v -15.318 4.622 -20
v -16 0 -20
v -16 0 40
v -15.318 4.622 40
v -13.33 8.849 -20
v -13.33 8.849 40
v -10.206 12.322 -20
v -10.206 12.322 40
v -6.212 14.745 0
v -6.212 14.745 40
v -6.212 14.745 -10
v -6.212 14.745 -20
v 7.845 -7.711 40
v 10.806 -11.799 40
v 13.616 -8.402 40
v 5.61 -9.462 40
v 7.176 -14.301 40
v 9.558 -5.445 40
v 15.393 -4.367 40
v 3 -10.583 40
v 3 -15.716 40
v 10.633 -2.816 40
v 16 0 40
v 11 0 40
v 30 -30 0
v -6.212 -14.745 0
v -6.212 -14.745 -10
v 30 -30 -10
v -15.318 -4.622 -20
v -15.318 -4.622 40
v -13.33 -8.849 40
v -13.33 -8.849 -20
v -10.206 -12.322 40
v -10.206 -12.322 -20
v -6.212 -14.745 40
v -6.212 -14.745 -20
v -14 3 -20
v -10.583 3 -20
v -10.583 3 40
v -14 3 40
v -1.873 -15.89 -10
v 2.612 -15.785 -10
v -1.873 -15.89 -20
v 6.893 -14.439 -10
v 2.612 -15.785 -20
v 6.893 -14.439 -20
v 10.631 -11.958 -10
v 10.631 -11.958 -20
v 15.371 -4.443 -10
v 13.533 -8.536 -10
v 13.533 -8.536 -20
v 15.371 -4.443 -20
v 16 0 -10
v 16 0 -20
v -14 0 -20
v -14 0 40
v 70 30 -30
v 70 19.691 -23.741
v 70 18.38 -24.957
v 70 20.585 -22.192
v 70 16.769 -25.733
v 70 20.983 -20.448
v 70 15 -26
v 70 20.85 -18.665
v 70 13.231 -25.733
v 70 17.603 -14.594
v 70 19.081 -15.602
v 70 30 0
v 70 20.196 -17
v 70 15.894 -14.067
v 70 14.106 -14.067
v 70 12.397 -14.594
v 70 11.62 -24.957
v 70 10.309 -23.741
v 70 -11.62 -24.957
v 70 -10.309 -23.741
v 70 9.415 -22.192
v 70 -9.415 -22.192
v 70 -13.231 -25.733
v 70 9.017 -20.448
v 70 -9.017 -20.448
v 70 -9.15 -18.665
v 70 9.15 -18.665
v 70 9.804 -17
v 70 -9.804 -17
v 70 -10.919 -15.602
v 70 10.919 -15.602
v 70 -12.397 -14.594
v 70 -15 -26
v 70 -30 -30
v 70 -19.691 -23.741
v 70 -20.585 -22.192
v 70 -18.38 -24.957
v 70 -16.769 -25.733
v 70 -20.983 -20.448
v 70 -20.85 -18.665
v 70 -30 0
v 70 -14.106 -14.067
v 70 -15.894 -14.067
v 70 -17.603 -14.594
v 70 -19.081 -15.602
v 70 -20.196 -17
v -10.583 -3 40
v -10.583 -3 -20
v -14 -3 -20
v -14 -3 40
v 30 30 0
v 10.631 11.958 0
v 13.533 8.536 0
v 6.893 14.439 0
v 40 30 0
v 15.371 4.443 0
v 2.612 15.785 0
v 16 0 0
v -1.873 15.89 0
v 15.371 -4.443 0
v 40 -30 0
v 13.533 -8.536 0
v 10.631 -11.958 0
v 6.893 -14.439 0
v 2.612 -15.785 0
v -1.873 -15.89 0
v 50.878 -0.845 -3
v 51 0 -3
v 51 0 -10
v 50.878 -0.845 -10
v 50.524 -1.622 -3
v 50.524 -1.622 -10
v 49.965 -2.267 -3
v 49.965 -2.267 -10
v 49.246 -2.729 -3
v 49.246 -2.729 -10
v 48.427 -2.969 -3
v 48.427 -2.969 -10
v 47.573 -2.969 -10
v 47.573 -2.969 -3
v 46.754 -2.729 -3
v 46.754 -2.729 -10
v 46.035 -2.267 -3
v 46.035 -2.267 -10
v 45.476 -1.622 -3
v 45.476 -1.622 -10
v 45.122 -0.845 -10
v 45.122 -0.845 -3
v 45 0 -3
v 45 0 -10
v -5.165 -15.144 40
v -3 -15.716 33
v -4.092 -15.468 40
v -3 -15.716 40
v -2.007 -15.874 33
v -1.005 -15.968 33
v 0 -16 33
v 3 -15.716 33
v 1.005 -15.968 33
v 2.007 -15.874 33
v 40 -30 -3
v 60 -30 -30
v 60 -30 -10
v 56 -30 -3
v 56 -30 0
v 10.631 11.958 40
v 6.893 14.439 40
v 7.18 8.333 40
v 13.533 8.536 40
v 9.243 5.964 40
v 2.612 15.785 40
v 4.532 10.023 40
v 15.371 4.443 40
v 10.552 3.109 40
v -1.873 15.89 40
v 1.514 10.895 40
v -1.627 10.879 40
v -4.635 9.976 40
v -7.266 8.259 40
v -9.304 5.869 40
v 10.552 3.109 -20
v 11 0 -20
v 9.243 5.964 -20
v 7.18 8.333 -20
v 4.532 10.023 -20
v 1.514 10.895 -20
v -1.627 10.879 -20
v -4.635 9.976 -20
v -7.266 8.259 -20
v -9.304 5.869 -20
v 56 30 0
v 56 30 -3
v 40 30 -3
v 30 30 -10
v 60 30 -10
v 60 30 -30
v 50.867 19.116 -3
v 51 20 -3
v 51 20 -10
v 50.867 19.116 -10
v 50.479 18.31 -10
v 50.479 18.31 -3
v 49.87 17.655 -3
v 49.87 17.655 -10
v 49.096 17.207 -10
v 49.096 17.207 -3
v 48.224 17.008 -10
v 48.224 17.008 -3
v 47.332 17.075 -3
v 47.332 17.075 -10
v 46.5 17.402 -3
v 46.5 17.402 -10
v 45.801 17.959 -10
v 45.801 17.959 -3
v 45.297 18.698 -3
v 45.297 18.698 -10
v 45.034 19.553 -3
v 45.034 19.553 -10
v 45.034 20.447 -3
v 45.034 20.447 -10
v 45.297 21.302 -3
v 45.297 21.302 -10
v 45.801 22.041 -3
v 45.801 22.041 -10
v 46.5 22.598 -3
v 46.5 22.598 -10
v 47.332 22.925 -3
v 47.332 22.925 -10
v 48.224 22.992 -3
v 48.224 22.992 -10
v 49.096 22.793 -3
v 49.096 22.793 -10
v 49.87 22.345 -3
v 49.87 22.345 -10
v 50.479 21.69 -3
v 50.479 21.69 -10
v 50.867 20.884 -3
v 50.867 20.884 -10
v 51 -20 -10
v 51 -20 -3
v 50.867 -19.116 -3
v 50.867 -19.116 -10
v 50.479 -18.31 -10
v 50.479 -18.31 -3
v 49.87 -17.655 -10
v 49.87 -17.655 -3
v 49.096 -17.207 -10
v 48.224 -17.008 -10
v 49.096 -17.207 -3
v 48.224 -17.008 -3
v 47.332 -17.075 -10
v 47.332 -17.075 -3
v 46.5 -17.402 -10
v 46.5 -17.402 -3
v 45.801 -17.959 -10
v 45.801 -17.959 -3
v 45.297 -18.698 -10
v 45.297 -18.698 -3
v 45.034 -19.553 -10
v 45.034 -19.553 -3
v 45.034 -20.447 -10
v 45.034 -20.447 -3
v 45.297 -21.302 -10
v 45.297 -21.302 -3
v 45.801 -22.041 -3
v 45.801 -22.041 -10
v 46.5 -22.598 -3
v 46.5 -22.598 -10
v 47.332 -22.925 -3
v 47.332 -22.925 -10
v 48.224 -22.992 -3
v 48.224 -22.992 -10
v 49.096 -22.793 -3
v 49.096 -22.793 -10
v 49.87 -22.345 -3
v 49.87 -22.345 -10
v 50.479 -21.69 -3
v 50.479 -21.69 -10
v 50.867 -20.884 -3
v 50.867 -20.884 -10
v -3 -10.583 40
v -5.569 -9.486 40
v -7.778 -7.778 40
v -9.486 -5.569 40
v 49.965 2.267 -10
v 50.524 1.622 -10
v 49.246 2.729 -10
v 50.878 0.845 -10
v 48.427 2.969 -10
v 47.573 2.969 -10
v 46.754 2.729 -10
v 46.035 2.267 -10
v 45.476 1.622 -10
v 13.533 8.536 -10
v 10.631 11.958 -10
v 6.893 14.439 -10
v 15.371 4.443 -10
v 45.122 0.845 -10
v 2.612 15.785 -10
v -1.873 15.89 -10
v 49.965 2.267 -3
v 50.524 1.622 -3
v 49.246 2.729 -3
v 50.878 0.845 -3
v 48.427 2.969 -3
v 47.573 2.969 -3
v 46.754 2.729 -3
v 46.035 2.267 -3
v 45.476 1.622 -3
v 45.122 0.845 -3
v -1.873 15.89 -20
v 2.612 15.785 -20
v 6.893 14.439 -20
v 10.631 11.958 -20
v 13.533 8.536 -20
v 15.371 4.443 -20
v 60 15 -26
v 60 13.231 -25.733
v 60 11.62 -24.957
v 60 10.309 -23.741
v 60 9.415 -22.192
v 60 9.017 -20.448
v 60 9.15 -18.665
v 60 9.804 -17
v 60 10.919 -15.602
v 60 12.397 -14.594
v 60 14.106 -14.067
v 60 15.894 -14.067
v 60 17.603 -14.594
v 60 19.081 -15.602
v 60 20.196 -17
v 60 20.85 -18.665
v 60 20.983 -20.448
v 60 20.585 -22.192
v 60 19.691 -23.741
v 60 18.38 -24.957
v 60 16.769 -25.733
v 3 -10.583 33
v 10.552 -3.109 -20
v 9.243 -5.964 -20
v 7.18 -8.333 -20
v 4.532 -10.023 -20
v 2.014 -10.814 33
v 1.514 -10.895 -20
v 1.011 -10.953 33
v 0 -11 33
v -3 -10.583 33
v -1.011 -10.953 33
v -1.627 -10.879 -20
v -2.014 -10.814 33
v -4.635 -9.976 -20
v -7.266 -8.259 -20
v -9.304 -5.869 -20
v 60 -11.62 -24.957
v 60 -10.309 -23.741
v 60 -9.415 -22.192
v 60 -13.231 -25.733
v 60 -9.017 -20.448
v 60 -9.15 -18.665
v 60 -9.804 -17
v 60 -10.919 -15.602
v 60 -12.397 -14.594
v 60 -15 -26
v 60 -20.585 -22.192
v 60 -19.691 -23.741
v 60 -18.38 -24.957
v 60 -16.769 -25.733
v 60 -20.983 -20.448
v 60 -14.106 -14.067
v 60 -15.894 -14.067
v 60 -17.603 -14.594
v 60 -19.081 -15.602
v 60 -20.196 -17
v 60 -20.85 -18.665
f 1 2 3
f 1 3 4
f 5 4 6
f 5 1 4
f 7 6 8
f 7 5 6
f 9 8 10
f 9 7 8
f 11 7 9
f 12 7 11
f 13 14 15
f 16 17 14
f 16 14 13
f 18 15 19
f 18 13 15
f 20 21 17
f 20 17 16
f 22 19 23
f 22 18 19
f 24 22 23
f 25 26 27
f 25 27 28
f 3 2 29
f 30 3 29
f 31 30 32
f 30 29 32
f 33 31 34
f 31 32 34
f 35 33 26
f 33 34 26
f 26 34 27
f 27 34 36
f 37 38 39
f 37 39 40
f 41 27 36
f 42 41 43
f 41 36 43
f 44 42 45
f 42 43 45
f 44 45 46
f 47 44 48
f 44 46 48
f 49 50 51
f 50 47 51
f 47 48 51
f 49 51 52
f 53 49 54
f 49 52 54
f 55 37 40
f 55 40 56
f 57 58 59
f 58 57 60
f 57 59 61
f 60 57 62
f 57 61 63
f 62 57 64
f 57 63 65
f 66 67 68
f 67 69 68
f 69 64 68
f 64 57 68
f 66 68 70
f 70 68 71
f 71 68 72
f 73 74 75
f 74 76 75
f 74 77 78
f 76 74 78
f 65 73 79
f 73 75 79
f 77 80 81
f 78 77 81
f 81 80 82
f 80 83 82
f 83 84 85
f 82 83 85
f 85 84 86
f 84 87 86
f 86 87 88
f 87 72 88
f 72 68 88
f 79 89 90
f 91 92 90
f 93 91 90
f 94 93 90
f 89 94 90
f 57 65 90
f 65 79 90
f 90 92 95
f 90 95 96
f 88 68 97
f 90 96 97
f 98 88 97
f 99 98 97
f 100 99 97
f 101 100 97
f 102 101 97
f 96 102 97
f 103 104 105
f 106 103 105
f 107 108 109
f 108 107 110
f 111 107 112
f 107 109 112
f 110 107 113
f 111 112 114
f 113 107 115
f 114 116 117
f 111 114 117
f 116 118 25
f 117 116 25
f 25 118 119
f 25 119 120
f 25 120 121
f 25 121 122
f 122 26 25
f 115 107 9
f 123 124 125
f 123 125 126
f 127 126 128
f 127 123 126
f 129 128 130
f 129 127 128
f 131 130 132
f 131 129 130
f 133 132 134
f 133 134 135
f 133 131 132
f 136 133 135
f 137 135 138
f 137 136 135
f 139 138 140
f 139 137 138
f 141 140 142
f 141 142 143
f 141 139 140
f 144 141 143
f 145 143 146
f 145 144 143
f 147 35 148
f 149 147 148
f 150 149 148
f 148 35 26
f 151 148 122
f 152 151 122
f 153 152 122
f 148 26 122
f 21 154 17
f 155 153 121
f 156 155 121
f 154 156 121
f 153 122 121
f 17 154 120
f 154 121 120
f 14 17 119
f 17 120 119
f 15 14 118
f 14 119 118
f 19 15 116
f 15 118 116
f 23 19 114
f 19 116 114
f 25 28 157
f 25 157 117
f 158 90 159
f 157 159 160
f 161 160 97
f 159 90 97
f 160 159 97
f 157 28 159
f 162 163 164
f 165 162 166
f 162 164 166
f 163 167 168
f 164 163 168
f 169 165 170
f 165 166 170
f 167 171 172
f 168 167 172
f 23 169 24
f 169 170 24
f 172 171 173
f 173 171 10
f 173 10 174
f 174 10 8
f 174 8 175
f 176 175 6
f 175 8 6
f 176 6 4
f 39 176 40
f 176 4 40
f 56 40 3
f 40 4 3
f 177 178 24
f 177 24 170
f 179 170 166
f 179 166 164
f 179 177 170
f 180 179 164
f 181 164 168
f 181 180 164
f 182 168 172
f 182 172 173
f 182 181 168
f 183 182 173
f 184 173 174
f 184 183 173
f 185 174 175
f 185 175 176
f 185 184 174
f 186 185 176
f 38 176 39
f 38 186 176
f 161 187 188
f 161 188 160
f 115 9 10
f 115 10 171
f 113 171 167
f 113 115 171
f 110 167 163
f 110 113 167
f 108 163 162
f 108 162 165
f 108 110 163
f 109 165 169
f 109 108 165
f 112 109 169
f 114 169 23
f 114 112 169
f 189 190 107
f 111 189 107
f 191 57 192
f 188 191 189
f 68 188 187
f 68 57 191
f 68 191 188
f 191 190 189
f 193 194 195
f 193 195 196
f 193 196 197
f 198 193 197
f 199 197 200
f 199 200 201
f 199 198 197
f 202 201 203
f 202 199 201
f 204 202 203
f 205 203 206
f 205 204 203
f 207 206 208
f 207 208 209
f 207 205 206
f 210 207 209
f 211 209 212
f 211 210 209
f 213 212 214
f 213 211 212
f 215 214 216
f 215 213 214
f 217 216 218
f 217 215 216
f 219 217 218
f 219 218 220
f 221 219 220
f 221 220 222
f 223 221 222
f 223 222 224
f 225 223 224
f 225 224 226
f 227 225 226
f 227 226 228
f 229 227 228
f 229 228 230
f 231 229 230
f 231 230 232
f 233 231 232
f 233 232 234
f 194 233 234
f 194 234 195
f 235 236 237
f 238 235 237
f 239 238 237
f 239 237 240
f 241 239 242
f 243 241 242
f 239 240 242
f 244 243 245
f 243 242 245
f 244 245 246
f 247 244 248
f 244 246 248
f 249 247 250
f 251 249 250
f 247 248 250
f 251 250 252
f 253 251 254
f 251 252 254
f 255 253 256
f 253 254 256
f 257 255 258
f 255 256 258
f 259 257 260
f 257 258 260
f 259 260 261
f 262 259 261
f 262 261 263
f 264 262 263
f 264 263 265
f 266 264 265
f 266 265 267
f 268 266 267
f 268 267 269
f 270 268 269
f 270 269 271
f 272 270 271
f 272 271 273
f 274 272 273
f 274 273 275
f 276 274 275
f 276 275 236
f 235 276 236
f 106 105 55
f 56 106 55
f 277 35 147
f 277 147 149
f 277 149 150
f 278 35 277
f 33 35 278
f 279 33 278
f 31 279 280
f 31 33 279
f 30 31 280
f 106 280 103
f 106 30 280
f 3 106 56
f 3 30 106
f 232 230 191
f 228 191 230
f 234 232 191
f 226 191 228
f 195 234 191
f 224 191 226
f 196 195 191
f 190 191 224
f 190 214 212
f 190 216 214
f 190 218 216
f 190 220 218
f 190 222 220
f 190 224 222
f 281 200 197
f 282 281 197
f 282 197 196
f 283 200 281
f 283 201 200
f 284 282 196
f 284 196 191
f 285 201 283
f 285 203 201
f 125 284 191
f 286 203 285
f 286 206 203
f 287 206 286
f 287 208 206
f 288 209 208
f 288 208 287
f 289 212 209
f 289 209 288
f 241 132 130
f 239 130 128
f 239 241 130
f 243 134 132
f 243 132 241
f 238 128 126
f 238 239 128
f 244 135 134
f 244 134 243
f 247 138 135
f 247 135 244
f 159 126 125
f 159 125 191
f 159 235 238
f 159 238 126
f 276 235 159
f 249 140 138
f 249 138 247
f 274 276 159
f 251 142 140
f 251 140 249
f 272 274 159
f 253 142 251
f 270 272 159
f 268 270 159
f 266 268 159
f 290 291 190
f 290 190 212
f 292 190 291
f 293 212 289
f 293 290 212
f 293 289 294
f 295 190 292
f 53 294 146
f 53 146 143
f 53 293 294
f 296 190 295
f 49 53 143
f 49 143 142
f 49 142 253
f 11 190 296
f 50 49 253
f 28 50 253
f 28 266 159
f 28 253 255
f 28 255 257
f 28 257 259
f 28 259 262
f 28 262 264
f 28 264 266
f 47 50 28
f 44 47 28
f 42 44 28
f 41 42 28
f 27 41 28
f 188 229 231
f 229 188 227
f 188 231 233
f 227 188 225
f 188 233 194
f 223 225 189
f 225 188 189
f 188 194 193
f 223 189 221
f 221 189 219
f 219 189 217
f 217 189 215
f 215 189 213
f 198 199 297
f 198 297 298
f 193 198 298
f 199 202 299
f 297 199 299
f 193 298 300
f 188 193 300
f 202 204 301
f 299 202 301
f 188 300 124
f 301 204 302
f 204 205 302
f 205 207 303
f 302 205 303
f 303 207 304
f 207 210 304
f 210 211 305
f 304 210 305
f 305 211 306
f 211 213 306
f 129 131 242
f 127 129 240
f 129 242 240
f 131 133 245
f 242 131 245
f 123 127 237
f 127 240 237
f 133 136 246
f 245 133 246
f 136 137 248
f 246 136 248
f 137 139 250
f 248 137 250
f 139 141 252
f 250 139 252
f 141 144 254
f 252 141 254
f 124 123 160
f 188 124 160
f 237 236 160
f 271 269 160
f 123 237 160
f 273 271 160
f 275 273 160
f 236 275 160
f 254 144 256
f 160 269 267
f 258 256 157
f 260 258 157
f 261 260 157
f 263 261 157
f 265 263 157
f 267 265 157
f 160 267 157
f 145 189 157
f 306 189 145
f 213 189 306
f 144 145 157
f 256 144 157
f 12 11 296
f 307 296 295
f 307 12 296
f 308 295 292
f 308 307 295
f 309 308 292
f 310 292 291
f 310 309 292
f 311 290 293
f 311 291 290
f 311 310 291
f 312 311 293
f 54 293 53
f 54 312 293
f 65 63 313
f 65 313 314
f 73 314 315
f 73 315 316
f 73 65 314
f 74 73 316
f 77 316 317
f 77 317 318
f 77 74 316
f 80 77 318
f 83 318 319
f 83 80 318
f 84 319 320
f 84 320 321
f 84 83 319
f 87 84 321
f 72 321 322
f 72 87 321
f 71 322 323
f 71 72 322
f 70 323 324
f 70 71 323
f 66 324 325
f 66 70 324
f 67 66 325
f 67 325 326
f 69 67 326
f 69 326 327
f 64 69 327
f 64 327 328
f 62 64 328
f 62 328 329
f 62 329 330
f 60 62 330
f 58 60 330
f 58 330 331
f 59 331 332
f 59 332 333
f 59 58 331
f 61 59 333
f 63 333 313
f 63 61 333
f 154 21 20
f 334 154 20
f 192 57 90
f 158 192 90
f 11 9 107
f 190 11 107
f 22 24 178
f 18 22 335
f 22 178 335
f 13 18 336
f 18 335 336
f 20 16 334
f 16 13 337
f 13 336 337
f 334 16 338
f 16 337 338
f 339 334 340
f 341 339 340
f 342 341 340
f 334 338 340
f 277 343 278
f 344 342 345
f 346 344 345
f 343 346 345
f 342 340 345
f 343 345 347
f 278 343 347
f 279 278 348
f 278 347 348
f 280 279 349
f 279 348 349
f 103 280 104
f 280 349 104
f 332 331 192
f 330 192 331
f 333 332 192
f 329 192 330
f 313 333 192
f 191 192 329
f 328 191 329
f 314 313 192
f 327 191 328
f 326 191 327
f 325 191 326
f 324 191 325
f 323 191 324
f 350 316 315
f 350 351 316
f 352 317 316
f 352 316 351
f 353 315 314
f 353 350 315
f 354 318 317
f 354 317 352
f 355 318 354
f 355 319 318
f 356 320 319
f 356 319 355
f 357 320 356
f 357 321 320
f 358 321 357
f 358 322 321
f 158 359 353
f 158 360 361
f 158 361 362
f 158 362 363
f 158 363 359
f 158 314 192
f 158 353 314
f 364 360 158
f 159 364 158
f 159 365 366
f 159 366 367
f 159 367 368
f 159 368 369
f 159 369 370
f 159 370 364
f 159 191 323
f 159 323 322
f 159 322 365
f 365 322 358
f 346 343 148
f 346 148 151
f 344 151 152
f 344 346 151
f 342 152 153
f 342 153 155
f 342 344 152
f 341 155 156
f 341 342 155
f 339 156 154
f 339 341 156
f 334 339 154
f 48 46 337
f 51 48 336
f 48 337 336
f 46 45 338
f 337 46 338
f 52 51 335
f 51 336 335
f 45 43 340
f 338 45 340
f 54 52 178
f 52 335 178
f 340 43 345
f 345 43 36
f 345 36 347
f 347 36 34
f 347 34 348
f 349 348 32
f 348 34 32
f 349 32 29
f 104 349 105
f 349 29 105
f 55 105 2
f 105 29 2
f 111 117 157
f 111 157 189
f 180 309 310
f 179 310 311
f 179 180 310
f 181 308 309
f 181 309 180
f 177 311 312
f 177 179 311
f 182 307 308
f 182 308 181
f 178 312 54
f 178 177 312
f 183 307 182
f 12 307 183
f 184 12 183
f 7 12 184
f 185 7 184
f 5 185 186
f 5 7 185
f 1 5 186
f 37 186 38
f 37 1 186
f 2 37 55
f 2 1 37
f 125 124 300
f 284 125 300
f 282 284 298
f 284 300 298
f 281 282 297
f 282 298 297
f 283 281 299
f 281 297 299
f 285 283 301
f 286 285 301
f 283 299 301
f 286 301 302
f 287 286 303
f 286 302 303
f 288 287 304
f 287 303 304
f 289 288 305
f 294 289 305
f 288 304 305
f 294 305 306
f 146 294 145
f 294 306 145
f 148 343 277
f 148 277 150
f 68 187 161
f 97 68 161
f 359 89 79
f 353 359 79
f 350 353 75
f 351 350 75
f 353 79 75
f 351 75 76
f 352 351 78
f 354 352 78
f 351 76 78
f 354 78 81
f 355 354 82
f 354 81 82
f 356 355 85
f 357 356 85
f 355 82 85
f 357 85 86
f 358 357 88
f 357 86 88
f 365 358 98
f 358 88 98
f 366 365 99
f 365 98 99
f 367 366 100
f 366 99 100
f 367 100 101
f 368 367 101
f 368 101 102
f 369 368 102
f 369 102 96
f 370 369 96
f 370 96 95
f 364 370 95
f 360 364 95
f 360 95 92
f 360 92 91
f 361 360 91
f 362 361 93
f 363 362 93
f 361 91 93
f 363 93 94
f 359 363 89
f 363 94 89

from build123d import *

# Parameters (mm, degrees)
SKETCH2_R                = 3
BOSS_EXTRUDE1_DEPTH      = 10
SKETCH2_5_R              = 3
CUT_EXTRUDE1_DEPTH       = 3
BOSS_EXTRUDE2_DEPTH      = 40
BOSS_EXTRUDE2_DEPTH_BACK = 20
SKETCH3_W                = 30
SKETCH3_H                = 20
SKETCH3_R                = 6
BOSS_EXTRUDE3_DEPTH      = 10
CUT_EXTRUDE2_START       = -7
CUT_EXTRUDE2_DEPTH       = 7


with BuildPart() as part:
    # Sketch2 → Boss-Extrude1 (new body)
    with BuildSketch(Plane(origin=(0, 0, 0), x_dir=(0, 1, 0), z_dir=(0, 0, 1))):
        with BuildLine():
            ThreePointArc((0, -16), (-13.330167524, -8.849103559), (-14.745004109, 6.211670776))
            Line((-14.745004109, 6.211670776), (-30, -30))
            Line((-30, -30), (-30, -70))
            Line((-30, -70), (0, -70))
            Line((0, -70), (0, -51))
            ThreePointArc((0, -51), (-3, -48), (0, -45))
            Line((0, -45), (0, -16))
        make_face()
        with Locations((-20, -48)):
            Circle(SKETCH2_R, mode=Mode.SUBTRACT)
    extrude(amount=-BOSS_EXTRUDE1_DEPTH)

    # Sketch2<5> → Cut-Extrude1 (cut)
    with BuildSketch(Plane(origin=(0, 0, 0), x_dir=(0, 1, 0), z_dir=(0, 0, 1))):
        with BuildLine():
            Line((0, -40), (-30, -40))
            Line((-30, -40), (-30, -56))
            Line((-30, -56), (0, -56))
            Line((0, -56), (0, -51))
            ThreePointArc((0, -51), (-3, -48), (0, -45))
            Line((0, -45), (0, -40))
        make_face()
        with Locations((-20, -48)):
            Circle(SKETCH2_5_R, mode=Mode.SUBTRACT)
    extrude(amount=-CUT_EXTRUDE1_DEPTH, mode=Mode.SUBTRACT)

    # Sketch2<6> → Boss-Extrude2 (add, two sides: drawn at the far end of the back side and taken through both)
    with BuildSketch(Plane(origin=(0, 0, 0), x_dir=(0, 1, 0), z_dir=(0, 0, 1)).offset(-BOSS_EXTRUDE2_DEPTH_BACK)):
        with BuildLine():
            ThreePointArc((0, 16), (-8.849103559, 13.330167524), (-14.745004109, 6.211670776))
            ThreePointArc((-14.745004109, 6.211670776), (-13.330167524, -8.849103559), (0, -16))
            Line((0, -16), (0, -11))
            ThreePointArc((0, -11), (-10.895252583, -1.514421063), (-3, 10.583005244))
            Line((-3, 10.583005244), (-3, 14))
            Line((-3, 14), (0, 14))
            Line((0, 14), (0, 16))
        make_face()
    extrude(amount=BOSS_EXTRUDE2_DEPTH + BOSS_EXTRUDE2_DEPTH_BACK)

    # Sketch3 → Boss-Extrude3 (add)
    with BuildSketch(Plane.YZ.offset(70)):
        with Locations((-15, -20)):
            Rectangle(SKETCH3_W, SKETCH3_H)
        with Locations((-15, -20)):
            Circle(SKETCH3_R, mode=Mode.SUBTRACT)
    extrude(amount=-BOSS_EXTRUDE3_DEPTH)

    # Mirror1: part across plane


with BuildPart() as part_1:
    add(part.part)
    add(part.part.mirror(Plane(origin=(0, 0, -10), x_dir=(0, 0, 1), z_dir=(0, 1, 0))))

    # Sketch4 → Cut-Extrude2 (cut)
    with BuildSketch(Plane.XY.offset(40).offset(CUT_EXTRUDE2_START)):
        with BuildLine():
            ThreePointArc((3, -10.583005244), (0, -11), (-3, -10.583005244))
            Line((-3, -10.583005244), (-3, -15.716233646))
            ThreePointArc((-3, -15.716233646), (0, -16), (3, -15.716233646))
            Line((3, -15.716233646), (3, -10.583005244))
        make_face()
    extrude(amount=CUT_EXTRUDE2_DEPTH, mode=Mode.SUBTRACT)


solid = part_1.part
